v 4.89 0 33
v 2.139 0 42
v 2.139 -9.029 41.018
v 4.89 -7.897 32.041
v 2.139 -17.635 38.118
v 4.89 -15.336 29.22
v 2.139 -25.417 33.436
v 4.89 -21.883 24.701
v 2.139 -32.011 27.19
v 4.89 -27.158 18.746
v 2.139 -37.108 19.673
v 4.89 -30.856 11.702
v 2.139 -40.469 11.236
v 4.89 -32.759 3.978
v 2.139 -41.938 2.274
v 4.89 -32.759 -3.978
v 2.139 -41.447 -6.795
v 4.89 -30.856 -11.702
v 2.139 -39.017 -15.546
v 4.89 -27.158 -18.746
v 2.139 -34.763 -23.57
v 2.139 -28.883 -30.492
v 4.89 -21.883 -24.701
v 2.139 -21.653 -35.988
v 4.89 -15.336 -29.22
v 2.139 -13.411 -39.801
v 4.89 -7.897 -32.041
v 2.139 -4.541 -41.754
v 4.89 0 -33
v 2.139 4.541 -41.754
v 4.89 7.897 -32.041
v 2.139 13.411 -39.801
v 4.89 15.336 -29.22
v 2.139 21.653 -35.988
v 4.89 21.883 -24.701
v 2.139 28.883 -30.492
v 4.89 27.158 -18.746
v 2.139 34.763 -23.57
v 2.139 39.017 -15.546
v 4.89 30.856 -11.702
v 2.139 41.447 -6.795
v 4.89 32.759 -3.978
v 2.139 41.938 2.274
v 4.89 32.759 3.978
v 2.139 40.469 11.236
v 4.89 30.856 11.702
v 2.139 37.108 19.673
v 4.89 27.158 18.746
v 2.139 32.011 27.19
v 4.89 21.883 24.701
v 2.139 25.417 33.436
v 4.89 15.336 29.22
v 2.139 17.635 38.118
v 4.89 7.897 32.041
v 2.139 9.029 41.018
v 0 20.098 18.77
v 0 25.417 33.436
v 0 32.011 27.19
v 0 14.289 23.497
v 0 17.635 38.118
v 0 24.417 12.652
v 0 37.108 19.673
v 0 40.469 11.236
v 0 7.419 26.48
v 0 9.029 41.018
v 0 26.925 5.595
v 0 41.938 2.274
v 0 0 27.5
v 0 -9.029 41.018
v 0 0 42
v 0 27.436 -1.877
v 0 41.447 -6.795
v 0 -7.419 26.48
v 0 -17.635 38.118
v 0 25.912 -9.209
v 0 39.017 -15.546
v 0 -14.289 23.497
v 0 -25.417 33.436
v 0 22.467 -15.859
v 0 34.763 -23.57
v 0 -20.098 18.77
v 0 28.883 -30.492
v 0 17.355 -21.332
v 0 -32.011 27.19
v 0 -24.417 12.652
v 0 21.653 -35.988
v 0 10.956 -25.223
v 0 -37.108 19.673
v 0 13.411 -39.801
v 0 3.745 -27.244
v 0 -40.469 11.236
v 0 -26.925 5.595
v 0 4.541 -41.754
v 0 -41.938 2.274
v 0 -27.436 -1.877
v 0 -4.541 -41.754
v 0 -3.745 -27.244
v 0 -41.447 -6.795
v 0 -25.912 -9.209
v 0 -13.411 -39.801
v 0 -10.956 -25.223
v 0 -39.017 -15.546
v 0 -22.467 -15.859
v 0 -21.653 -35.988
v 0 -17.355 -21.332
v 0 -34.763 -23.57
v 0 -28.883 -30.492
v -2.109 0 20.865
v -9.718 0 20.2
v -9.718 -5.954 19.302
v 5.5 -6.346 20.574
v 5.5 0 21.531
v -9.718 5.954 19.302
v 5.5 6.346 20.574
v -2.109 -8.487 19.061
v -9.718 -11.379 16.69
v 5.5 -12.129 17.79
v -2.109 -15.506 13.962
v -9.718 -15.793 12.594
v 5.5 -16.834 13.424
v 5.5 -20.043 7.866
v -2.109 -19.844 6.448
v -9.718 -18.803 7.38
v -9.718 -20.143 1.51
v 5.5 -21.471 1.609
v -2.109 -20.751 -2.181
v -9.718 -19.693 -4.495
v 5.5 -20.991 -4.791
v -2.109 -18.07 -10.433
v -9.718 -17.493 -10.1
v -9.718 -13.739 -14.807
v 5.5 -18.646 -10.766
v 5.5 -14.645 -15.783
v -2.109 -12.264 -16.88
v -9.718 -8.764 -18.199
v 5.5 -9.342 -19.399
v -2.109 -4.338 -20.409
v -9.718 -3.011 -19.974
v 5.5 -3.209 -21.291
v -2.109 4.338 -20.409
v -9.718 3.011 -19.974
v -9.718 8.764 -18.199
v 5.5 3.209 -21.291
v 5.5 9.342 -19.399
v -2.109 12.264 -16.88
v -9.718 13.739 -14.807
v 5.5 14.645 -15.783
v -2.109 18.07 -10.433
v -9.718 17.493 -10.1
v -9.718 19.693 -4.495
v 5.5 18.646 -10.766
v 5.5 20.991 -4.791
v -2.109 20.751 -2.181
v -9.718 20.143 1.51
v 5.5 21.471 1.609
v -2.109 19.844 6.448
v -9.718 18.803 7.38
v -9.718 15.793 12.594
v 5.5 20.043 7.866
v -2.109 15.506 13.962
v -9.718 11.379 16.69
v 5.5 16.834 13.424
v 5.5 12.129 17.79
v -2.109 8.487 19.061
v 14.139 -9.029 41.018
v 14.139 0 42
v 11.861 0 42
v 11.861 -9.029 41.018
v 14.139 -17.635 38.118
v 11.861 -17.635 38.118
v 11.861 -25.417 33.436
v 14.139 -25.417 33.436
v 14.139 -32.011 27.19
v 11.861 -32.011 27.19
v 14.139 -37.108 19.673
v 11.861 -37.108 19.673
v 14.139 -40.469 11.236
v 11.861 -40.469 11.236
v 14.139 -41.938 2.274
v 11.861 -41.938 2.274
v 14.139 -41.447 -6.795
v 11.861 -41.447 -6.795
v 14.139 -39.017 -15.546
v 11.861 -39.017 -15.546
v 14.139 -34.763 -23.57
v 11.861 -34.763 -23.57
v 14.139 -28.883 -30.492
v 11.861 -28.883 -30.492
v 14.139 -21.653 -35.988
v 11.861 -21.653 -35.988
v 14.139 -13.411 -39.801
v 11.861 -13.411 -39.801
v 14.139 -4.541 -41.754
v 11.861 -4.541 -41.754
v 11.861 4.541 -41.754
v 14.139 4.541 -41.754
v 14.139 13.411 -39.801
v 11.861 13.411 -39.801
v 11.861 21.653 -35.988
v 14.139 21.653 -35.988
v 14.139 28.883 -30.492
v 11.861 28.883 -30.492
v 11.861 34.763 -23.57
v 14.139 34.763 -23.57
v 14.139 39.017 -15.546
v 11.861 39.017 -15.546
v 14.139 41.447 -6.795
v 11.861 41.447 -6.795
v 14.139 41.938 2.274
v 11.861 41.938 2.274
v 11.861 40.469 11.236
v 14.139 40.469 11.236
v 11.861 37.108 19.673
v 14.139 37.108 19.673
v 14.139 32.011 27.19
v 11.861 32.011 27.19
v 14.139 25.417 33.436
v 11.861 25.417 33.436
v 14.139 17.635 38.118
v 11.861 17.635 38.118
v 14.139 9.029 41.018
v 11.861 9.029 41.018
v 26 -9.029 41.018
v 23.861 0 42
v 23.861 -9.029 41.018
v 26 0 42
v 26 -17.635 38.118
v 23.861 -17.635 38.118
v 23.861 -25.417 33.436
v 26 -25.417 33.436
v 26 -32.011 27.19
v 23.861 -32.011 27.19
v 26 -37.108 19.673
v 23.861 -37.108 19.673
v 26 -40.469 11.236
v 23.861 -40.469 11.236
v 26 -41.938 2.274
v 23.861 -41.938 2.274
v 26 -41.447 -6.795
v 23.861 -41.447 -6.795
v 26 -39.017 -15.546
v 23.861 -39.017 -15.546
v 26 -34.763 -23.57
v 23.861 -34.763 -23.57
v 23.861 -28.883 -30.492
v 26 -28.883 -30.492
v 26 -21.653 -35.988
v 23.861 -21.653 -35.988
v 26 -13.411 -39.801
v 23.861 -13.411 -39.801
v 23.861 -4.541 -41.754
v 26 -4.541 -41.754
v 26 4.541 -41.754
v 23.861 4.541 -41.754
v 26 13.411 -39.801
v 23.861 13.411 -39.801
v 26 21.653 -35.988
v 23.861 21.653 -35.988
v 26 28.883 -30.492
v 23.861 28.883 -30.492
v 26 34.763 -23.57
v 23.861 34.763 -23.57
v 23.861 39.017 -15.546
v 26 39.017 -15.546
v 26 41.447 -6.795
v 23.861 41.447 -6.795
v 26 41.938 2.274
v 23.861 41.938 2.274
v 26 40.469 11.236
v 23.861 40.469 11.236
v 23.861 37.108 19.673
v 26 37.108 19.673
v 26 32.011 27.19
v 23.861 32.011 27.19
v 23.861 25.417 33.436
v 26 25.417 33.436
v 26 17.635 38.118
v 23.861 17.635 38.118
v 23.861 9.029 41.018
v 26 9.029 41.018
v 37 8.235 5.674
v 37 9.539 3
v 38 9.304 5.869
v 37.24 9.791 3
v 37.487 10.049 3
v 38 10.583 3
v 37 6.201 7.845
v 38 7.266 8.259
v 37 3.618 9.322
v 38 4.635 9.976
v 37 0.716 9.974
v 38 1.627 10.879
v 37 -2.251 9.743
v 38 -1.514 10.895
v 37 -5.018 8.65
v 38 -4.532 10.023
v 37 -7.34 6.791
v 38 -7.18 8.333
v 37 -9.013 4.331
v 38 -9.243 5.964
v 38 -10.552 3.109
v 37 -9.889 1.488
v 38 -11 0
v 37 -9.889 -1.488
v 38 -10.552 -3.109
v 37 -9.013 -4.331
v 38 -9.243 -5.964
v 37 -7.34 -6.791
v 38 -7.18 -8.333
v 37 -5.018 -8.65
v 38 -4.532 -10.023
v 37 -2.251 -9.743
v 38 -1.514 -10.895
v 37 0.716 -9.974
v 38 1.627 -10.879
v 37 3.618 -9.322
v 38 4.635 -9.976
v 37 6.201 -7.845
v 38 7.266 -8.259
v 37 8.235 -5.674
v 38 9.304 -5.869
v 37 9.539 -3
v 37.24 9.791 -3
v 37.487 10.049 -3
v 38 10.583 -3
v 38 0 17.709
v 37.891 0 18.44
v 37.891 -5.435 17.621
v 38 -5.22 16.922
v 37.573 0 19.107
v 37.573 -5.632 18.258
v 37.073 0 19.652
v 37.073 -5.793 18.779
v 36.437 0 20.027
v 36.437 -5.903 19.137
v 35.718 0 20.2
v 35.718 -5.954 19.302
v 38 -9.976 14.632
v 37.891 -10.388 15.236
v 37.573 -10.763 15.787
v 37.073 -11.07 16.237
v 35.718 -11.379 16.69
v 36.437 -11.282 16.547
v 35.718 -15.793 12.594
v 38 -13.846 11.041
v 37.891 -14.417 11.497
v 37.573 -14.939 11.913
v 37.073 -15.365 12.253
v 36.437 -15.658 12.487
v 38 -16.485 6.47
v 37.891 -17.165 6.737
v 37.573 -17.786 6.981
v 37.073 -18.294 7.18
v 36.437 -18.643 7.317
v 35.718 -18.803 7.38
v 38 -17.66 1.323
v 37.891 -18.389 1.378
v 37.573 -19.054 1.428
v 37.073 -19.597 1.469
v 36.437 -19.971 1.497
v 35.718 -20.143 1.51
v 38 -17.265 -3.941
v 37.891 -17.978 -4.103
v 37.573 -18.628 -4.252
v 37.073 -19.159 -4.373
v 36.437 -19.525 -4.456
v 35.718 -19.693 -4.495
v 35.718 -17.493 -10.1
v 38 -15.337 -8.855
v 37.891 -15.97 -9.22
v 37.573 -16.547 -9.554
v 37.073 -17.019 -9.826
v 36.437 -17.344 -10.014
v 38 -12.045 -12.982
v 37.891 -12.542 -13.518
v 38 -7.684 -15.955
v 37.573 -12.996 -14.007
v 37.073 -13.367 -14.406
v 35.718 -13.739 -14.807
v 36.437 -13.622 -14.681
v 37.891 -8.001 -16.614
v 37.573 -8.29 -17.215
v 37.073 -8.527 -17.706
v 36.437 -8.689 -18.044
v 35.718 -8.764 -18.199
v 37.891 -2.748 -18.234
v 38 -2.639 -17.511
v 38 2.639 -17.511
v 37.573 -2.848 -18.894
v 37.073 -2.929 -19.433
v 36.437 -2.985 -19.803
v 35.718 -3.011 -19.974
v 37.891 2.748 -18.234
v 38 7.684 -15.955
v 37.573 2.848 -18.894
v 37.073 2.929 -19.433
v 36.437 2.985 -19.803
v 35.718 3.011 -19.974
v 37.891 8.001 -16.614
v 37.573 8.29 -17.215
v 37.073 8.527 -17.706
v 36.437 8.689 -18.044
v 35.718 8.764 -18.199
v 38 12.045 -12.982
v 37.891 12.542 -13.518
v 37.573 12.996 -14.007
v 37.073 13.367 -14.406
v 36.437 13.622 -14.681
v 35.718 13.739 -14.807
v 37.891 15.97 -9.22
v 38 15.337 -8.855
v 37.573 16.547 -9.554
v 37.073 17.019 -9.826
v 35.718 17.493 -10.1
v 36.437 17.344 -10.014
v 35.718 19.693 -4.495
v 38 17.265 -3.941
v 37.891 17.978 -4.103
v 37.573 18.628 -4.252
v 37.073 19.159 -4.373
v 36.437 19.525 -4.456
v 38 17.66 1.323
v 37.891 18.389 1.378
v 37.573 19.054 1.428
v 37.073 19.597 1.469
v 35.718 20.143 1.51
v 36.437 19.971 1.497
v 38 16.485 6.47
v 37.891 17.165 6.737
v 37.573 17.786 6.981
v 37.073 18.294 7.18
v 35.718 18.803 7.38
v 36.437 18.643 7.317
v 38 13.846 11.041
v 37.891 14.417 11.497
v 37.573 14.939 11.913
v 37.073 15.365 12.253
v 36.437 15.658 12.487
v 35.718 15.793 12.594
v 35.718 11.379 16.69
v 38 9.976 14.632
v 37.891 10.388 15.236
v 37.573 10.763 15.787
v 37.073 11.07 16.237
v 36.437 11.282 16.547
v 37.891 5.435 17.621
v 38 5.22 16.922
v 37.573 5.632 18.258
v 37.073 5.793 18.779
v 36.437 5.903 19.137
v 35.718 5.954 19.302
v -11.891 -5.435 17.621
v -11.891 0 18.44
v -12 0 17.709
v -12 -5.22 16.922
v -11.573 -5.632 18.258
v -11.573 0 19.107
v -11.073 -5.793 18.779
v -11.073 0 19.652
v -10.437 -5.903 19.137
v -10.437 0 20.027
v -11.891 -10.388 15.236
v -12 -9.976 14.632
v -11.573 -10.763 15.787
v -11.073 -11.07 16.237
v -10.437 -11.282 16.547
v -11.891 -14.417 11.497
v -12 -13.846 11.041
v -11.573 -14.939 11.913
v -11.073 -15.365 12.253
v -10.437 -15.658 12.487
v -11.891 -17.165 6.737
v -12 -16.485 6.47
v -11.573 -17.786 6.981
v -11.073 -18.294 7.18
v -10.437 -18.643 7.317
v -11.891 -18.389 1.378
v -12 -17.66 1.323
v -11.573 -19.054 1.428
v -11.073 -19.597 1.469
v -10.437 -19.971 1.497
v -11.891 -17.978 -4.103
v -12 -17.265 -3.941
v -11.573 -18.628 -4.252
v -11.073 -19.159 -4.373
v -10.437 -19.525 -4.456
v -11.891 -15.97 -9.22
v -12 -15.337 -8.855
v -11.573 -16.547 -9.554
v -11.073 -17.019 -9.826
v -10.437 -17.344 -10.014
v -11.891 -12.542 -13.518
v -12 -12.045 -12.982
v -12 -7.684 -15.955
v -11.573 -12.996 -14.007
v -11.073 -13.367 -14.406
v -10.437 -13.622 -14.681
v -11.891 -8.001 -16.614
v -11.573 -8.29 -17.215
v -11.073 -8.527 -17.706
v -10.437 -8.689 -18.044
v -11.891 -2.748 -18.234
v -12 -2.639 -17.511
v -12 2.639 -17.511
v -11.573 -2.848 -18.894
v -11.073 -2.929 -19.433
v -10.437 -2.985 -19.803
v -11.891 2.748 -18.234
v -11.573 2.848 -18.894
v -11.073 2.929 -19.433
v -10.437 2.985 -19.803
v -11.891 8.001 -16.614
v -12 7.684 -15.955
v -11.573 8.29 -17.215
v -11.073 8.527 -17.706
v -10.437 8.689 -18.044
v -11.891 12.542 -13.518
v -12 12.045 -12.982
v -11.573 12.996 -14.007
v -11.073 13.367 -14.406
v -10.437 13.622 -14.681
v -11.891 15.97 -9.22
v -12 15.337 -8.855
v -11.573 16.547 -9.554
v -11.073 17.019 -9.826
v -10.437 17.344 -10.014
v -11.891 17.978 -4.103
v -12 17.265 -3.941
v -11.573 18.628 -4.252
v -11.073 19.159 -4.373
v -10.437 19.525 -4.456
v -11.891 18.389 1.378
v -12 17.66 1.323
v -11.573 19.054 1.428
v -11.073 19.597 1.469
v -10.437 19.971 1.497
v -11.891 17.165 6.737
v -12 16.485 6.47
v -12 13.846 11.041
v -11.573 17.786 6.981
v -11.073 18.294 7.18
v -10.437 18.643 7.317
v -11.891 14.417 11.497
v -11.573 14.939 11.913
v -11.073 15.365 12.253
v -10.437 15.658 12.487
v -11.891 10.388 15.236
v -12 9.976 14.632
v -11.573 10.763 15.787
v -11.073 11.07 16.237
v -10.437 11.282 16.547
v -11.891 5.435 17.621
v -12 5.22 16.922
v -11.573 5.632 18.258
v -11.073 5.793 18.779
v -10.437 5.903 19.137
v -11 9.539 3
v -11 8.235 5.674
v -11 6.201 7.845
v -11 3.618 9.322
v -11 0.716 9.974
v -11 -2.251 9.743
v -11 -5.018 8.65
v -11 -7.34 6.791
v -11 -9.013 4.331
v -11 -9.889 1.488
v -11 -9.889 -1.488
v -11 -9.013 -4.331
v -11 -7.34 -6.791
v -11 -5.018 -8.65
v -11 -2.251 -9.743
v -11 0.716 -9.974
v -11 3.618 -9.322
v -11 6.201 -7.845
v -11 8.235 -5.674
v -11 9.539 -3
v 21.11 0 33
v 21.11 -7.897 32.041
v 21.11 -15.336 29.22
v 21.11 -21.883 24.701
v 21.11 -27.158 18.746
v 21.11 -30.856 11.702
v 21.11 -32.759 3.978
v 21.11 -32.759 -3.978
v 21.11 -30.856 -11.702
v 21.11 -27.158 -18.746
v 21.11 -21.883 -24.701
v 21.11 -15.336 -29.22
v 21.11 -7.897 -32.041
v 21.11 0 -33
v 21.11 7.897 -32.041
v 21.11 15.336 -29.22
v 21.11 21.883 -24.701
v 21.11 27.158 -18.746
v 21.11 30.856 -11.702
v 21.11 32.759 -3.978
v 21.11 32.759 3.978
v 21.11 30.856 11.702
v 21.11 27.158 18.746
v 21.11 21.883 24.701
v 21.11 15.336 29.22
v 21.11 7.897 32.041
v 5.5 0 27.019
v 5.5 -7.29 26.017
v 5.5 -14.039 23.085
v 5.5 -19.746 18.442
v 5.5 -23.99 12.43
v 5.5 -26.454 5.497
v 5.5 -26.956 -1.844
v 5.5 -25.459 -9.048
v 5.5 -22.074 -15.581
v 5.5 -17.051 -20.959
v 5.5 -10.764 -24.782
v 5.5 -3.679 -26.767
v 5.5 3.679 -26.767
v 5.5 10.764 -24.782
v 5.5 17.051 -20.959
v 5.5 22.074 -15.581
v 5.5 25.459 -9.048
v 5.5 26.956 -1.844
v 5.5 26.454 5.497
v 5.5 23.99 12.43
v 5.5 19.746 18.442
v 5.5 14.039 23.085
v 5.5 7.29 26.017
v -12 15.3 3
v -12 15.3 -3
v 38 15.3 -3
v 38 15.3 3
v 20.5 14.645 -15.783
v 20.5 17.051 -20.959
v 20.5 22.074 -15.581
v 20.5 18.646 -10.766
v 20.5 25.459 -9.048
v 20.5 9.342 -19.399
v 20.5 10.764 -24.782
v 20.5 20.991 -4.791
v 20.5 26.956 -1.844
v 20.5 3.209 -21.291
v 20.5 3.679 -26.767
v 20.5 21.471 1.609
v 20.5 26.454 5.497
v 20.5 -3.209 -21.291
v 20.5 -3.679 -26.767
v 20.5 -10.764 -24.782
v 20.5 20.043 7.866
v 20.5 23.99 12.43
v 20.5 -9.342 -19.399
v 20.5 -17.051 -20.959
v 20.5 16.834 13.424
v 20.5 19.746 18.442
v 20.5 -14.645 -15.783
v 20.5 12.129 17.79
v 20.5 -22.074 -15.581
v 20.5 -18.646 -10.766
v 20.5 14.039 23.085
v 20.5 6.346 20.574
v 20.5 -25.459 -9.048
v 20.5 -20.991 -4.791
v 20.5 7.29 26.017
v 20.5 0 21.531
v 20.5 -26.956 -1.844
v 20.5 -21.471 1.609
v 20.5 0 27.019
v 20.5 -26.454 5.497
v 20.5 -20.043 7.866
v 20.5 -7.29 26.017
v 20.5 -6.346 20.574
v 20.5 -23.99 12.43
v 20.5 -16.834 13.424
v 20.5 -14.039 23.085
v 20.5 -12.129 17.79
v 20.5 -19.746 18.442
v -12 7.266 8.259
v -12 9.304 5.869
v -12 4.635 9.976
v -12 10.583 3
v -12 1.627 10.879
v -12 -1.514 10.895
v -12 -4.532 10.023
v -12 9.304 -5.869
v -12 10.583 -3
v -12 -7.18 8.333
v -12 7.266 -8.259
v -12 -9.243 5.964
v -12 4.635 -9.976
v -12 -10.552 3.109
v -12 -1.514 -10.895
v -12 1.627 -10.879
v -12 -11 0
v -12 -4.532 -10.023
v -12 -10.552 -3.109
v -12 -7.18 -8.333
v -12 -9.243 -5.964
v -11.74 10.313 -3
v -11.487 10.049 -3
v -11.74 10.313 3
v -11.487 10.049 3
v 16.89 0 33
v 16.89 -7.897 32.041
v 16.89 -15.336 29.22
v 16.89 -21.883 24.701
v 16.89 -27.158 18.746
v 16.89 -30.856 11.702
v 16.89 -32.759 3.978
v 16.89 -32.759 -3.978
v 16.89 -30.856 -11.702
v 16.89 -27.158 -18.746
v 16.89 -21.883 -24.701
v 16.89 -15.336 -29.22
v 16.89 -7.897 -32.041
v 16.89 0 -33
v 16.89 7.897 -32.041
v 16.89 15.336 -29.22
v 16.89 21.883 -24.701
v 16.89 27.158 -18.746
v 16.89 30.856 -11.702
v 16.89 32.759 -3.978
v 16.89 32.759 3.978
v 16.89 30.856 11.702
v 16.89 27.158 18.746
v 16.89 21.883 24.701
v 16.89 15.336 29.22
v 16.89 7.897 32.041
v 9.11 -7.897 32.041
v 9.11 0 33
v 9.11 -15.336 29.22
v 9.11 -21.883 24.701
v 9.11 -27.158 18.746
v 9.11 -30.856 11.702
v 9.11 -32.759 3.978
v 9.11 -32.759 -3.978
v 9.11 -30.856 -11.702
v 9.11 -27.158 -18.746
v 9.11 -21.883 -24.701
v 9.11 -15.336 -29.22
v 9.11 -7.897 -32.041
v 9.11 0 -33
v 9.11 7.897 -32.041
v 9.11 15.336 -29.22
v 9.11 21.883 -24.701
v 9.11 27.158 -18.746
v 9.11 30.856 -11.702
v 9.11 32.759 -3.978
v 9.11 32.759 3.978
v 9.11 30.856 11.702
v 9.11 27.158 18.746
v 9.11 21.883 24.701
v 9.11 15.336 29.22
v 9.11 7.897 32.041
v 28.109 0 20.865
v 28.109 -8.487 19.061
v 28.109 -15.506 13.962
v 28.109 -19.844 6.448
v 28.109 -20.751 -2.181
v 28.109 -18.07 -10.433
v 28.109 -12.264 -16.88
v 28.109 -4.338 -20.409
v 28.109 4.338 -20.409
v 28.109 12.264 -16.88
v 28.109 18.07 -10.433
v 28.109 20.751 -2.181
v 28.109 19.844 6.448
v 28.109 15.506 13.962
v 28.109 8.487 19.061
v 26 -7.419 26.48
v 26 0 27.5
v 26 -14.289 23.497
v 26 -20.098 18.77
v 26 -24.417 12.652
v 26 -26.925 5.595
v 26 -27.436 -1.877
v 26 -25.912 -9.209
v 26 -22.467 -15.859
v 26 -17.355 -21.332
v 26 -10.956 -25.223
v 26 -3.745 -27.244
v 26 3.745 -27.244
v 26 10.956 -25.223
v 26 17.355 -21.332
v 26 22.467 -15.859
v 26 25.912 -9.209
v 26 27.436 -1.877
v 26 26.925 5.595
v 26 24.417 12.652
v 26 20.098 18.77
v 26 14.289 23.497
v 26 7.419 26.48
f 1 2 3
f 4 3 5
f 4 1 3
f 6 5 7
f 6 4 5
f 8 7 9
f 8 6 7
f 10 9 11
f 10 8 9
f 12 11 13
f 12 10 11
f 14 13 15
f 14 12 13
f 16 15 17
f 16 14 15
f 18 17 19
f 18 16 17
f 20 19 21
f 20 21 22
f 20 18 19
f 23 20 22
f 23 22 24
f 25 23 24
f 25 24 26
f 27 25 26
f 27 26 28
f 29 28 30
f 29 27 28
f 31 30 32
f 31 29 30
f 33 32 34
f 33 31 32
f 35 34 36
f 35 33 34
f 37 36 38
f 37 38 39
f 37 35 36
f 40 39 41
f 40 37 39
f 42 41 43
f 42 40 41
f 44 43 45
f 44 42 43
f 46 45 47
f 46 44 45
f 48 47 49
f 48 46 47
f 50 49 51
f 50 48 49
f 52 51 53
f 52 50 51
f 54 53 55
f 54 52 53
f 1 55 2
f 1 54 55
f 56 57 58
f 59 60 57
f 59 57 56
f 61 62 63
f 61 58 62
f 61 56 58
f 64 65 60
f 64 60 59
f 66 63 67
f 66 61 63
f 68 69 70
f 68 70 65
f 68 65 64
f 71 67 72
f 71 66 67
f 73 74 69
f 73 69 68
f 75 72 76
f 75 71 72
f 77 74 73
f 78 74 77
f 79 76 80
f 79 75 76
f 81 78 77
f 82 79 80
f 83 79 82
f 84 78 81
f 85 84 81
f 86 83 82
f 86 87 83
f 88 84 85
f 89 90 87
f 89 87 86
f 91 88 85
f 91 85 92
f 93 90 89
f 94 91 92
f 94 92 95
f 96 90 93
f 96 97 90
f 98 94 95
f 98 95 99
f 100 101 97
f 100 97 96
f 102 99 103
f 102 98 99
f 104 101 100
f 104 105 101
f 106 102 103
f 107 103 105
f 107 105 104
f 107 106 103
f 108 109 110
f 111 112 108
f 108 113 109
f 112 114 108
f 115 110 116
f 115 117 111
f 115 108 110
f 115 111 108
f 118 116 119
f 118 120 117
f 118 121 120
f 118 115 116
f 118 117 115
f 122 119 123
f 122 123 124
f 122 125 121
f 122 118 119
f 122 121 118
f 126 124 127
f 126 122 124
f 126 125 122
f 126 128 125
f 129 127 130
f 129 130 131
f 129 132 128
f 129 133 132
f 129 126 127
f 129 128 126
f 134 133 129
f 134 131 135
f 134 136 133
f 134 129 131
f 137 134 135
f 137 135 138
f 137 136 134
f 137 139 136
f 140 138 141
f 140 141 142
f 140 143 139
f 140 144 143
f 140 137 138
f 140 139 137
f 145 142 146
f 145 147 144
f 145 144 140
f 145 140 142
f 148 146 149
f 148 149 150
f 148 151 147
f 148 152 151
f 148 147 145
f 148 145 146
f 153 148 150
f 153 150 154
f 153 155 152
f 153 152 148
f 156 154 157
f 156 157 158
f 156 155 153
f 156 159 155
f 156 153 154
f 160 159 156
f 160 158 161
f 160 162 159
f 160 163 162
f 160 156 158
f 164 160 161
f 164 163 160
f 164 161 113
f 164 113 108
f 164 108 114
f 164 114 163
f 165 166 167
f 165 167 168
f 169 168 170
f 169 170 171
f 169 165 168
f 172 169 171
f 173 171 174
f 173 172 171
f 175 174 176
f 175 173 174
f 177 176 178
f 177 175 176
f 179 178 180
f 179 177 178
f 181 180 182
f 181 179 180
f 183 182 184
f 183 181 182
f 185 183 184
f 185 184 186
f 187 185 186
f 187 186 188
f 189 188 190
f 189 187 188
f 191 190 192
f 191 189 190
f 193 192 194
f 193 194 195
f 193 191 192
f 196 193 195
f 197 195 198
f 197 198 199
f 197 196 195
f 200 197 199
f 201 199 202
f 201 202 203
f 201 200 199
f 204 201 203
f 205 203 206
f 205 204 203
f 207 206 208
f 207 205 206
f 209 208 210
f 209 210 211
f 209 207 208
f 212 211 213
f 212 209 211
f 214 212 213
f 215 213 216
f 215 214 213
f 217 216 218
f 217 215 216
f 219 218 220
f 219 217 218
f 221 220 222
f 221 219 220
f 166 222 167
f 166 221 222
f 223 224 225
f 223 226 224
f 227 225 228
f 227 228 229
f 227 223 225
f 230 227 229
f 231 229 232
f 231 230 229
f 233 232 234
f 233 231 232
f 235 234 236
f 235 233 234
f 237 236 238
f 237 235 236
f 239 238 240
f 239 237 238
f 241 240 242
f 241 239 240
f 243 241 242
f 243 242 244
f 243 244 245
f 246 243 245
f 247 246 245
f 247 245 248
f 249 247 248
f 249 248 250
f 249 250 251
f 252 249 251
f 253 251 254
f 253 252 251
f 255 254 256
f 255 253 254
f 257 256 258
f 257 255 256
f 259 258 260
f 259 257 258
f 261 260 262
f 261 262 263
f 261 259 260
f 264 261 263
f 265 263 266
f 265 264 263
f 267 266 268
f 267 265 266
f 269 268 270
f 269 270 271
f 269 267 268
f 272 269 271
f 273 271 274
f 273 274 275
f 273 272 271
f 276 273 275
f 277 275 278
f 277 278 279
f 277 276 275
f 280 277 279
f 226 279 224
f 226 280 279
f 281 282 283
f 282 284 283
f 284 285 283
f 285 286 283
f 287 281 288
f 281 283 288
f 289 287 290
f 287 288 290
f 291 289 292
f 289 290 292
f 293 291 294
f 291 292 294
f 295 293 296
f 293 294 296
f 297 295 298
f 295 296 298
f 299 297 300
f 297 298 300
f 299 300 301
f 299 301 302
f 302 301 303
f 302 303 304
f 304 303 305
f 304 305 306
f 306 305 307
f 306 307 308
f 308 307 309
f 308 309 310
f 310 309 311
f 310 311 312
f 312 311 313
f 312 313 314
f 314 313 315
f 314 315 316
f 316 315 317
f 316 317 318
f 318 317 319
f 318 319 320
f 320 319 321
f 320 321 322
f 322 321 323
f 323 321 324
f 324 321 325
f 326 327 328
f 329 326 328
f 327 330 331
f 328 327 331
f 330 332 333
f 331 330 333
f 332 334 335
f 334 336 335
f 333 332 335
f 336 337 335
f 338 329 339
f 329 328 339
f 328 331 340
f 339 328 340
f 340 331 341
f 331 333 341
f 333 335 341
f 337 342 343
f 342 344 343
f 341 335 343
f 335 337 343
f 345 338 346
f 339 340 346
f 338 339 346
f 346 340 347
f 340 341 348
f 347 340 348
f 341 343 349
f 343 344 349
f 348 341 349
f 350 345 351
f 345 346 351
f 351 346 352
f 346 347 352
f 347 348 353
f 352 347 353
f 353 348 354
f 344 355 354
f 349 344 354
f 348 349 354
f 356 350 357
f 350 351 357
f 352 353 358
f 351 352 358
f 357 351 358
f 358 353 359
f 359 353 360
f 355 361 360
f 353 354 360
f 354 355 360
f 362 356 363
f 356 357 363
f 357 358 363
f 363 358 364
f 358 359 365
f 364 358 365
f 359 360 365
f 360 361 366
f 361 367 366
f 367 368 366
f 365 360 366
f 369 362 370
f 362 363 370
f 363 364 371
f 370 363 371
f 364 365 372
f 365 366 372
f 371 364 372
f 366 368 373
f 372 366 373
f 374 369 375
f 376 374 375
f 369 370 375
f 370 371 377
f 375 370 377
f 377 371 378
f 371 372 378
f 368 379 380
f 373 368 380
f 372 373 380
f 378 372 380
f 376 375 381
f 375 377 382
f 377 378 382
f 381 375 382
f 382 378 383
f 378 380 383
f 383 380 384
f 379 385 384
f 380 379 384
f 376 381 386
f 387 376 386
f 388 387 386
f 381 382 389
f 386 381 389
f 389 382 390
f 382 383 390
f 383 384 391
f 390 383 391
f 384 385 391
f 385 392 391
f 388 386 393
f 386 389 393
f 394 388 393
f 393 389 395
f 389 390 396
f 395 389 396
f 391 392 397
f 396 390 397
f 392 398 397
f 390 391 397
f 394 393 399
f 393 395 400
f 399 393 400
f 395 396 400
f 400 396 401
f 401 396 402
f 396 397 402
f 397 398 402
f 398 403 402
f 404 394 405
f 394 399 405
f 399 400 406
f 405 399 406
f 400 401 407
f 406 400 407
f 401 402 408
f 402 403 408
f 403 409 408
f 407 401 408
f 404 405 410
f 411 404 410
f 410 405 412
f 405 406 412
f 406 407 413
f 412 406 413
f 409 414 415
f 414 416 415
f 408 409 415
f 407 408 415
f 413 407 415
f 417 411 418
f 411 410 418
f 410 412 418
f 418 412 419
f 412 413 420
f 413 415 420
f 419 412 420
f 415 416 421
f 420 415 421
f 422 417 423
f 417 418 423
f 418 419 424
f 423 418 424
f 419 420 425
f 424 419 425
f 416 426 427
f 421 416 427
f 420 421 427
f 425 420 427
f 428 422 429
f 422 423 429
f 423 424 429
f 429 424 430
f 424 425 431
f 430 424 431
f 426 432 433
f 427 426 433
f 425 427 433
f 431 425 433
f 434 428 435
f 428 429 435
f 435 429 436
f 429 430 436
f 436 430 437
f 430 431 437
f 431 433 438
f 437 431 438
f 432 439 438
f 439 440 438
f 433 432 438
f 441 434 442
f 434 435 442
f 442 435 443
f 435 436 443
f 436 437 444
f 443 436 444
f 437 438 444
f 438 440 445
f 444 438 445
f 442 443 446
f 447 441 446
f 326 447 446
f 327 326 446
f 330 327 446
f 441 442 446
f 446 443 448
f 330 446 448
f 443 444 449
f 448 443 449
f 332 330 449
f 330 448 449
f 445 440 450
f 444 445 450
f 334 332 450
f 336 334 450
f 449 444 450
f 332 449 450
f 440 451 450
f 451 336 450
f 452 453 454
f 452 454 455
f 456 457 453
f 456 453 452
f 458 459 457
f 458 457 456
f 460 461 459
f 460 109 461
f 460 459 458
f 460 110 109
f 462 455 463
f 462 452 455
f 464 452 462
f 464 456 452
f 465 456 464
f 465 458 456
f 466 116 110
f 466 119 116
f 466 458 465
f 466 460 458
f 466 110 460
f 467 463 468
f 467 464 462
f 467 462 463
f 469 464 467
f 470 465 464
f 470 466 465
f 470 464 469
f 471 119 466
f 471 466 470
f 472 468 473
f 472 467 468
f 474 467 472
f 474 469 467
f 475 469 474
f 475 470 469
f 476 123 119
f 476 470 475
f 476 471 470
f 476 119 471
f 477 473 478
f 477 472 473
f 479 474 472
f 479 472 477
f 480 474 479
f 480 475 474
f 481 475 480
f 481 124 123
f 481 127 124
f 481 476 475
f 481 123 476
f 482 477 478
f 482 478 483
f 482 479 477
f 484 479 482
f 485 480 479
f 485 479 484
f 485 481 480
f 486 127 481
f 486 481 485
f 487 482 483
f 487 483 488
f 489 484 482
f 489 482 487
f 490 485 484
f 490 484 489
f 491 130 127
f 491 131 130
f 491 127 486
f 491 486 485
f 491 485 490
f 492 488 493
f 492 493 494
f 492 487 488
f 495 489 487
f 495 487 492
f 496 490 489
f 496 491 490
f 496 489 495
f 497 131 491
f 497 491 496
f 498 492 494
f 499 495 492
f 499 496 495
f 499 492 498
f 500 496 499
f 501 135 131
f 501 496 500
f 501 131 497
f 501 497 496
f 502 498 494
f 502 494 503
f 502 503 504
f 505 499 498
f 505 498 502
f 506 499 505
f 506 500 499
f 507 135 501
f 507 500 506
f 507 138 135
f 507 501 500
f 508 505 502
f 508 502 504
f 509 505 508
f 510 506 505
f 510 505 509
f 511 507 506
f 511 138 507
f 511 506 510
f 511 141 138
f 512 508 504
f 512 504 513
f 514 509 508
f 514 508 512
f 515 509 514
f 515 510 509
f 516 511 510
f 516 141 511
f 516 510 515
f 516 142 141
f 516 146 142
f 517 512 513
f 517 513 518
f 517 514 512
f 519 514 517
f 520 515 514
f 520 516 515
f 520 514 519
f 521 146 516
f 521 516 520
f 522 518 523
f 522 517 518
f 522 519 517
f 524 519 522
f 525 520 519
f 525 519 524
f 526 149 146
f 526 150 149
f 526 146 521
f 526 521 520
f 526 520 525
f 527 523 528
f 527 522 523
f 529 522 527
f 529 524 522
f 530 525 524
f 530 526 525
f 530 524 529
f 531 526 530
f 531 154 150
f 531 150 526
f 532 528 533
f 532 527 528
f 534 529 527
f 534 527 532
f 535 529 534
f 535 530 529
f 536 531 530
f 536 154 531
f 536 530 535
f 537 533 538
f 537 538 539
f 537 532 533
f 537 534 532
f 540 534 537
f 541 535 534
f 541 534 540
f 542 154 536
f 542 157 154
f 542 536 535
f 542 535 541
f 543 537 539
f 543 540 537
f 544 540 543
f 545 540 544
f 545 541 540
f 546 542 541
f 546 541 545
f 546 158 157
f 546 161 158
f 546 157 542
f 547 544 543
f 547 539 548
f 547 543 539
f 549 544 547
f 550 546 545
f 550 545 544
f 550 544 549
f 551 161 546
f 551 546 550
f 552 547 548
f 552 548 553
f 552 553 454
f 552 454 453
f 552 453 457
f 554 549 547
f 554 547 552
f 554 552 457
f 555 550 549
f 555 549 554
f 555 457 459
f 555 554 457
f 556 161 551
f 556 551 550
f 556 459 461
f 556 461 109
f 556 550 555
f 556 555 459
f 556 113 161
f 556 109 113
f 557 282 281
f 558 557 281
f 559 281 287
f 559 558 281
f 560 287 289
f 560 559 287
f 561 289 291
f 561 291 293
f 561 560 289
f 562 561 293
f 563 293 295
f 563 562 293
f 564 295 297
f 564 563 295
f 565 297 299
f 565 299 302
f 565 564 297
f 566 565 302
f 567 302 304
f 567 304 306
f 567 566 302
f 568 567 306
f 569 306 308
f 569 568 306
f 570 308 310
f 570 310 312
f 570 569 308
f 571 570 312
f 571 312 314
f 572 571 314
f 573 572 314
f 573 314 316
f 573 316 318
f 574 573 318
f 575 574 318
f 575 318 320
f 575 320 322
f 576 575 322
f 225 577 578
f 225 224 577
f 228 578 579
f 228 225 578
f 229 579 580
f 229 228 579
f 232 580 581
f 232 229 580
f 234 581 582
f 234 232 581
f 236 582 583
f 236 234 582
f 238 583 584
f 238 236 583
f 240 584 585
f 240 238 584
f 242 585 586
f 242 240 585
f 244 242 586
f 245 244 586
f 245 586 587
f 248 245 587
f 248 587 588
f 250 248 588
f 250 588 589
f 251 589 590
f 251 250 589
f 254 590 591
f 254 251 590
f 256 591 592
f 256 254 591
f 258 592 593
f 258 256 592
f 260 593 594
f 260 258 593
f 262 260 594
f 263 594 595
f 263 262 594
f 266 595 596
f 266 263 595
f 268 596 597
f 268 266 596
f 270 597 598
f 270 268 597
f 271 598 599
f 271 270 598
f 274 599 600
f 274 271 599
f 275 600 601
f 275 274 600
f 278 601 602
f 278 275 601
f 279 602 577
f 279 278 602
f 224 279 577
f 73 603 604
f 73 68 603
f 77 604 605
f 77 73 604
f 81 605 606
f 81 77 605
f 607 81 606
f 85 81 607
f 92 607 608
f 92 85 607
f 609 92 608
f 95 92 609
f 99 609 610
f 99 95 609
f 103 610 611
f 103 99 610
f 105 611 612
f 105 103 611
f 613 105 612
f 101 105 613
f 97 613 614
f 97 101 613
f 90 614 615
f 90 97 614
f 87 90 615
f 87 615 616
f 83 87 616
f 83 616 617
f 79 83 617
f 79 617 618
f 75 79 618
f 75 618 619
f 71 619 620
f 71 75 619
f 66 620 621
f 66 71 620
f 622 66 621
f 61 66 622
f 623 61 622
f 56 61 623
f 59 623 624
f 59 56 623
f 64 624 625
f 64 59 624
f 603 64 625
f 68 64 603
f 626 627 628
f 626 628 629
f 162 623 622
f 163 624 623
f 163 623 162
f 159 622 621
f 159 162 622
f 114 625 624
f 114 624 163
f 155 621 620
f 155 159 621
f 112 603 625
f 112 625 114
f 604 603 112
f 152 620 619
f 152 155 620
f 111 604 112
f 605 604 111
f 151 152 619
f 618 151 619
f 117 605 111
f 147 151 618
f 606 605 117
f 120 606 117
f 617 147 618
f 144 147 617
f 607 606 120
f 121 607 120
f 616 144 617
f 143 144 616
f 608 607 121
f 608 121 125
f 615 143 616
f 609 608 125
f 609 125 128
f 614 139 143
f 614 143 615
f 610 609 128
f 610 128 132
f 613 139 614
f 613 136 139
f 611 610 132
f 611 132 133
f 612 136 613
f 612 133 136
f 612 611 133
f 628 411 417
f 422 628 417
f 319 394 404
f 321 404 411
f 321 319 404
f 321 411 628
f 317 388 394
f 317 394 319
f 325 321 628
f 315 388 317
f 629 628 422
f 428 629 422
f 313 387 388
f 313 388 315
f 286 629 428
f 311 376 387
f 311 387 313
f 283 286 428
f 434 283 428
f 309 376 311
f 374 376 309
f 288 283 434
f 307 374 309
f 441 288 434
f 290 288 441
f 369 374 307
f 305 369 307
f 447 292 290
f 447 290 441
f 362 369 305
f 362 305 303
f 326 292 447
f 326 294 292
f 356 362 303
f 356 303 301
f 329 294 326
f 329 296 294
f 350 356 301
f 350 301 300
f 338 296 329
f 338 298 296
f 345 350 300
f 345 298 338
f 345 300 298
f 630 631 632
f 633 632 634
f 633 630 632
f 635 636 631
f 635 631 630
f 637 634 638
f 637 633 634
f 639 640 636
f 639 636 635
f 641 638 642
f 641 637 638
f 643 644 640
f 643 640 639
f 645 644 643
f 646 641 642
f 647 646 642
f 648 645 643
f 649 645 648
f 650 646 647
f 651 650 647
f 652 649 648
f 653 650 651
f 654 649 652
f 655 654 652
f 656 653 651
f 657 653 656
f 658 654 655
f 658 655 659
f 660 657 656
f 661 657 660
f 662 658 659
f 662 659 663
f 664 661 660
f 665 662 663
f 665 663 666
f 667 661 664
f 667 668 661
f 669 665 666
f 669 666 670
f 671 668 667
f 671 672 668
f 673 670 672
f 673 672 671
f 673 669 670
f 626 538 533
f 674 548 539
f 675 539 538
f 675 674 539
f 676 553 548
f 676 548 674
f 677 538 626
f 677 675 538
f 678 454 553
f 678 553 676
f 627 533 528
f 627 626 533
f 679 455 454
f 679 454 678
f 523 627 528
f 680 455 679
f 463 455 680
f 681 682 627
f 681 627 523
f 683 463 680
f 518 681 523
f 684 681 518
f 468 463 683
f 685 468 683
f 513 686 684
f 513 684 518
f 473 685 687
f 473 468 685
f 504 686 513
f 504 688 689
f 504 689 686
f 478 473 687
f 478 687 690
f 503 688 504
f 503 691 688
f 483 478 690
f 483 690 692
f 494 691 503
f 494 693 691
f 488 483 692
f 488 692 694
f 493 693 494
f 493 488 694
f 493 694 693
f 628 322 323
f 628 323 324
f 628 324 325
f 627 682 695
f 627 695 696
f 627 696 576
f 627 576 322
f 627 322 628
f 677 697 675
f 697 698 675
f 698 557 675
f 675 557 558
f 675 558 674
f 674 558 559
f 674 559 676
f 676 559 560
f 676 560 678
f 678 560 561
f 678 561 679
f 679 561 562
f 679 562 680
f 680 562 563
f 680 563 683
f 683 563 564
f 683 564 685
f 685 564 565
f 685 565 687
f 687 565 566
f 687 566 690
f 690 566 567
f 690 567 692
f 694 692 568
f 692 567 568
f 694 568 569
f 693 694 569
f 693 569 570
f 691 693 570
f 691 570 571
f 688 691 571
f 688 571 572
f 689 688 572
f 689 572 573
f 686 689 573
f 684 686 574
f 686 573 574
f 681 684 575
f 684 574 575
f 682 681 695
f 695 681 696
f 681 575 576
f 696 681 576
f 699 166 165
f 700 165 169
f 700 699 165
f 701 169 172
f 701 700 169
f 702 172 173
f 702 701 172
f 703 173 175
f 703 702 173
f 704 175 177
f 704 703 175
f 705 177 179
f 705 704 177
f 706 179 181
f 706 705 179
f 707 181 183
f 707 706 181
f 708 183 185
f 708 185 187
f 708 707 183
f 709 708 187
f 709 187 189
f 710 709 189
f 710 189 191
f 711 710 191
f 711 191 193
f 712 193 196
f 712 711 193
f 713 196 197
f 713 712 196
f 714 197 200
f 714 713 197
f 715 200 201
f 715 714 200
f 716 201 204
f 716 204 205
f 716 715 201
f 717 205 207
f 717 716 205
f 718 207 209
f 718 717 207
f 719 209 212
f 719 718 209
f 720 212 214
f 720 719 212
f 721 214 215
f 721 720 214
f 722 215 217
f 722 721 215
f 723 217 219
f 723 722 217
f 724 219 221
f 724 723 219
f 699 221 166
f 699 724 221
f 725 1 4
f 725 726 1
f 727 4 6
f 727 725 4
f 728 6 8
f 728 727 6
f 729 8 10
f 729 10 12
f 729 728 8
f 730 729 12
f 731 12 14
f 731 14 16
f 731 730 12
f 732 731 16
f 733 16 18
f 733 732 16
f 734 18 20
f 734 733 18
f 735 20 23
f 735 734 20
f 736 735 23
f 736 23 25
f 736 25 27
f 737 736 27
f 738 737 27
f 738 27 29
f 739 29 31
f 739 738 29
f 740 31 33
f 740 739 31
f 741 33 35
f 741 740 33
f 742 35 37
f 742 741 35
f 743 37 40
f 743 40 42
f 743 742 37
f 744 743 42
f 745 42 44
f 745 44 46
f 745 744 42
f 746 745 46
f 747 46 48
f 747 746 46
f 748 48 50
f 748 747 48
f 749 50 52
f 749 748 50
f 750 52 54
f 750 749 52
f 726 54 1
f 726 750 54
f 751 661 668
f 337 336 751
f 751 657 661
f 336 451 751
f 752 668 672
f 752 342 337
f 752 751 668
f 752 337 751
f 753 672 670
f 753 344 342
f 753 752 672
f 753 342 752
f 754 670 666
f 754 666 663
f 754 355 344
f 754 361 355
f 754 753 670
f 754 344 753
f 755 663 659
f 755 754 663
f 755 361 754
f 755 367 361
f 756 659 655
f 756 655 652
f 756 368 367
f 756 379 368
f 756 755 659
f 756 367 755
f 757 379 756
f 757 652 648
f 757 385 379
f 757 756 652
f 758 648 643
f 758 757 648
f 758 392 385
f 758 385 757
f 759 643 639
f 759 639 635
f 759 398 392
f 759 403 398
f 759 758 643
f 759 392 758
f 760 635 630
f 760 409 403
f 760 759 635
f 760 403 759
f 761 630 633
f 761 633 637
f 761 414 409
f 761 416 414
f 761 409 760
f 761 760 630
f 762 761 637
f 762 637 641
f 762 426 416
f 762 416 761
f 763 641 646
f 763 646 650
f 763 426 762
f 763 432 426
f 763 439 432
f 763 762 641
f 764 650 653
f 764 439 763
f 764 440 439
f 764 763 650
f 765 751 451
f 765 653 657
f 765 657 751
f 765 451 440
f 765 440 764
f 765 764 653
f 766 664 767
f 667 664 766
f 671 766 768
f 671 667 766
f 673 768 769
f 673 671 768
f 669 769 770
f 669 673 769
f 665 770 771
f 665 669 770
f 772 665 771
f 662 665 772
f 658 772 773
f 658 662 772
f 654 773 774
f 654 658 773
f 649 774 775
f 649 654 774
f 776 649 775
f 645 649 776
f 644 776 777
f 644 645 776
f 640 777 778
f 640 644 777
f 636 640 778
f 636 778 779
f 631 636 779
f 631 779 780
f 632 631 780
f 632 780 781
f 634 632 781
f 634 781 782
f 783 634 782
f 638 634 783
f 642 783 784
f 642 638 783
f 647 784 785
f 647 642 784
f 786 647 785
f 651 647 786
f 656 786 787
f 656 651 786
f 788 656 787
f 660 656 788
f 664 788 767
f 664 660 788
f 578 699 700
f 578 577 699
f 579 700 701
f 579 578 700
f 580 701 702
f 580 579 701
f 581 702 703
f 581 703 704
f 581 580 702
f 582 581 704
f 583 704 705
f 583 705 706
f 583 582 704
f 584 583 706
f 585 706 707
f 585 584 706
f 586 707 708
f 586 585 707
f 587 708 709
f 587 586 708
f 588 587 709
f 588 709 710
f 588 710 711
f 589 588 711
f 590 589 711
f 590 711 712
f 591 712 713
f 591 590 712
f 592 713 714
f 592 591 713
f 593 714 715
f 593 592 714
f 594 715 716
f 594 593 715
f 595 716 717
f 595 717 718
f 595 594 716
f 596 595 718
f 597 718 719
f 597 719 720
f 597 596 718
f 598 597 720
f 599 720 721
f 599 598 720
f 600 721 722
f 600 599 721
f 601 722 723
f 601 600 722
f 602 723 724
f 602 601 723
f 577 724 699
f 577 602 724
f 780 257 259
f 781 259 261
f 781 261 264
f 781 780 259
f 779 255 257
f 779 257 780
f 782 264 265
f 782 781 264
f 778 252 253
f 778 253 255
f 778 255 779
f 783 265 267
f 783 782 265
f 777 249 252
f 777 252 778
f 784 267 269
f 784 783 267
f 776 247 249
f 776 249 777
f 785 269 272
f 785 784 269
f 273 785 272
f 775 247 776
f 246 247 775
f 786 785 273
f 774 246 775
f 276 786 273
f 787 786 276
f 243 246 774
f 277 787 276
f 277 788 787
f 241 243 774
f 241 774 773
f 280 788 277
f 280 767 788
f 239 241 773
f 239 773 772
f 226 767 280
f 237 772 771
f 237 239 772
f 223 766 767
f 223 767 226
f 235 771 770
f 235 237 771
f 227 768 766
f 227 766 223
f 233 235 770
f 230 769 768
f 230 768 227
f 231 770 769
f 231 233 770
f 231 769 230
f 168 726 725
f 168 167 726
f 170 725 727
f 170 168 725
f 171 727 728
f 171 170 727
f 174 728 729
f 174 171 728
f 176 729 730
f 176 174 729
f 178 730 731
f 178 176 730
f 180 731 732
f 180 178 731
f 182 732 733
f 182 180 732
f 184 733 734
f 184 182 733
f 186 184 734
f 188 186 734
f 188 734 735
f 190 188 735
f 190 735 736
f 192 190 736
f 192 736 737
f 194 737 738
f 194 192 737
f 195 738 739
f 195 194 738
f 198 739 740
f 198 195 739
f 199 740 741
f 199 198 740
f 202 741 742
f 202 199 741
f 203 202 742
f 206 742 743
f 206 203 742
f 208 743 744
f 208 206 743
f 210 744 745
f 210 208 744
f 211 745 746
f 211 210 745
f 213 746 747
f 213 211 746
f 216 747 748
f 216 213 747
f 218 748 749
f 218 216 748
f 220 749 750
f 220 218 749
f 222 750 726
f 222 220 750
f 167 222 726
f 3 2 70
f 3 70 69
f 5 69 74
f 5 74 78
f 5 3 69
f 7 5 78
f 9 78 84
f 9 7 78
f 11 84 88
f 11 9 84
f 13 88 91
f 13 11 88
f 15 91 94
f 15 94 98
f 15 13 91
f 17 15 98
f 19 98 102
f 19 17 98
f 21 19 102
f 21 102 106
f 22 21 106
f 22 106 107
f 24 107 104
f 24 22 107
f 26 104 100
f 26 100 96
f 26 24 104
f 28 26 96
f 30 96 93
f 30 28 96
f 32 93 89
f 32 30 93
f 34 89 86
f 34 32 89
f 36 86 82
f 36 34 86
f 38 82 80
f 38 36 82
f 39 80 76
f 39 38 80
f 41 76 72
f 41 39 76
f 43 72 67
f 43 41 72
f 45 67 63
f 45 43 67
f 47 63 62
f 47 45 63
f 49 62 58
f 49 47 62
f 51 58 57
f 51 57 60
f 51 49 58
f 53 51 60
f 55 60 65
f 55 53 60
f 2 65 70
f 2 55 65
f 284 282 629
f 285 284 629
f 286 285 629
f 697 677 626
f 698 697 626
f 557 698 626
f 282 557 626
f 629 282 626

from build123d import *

# Parameters (mm, degrees)
PATTERN_LINEAR_951_COUNT = 2
PATTERN_LINEAR_951_PITCH = 12
CHAMFER_1_SIZE           = 1
SKETCH_4_W               = 6
SKETCH_4_H               = 5.760607938
CUT_EXTRUDE_1_DEPTH      = 78.640195775
FILLET_2_R               = 2.5


with BuildPart() as part:
    # 草图1 → 旋转1 (revolve)
    with BuildSketch(Plane.XY, mode=Mode.PRIVATE) as revolve_1_sk:
        Polygon((-12, 10), (-12, 20), (5.5, 21.531051612), (5.5, 27.018812351), (0, 27.5), (0, 42), (26, 42), (26, 27.5), (20.5, 27.018812351), (20.5, 21.531051612), (38, 20), (38, 10), align=None)
    revolve(revolve_1_sk.sketch.rotate(Axis((0, 0, 0), (1, 0, 0)), 90), axis=Axis((0, 0, 0), (1, 0, 0)))

    # 草图2 → 切除-旋转1 (revolve, cut)
    with BuildSketch(Plane.XY, mode=Mode.PRIVATE) as cut_revolve_1_sk:
        Polygon((9.10988523, 33), (11.861461363, 42), (2.138538637, 42), (4.89011477, 33), align=None)
    cut_revolve_1 = revolve(cut_revolve_1_sk.sketch.rotate(Axis((0, 0, 0), (1, 0, 0)), 90), axis=Axis((0, 0, 0), (1, 0, 0)), mode=Mode.SUBTRACT)

    # Pattern Linear 951: 切除-旋转1 ×2
    with Locations(*[(i * PATTERN_LINEAR_951_PITCH, 0, 0) for i in range(1, PATTERN_LINEAR_951_COUNT)]):
        add(cut_revolve_1, mode=Mode.SUBTRACT)

    # 倒角1
    chamfer_1_edges = [part.edges().sort_by_distance(p)[0] for p in [
        (-12, 0, -10),
        (38, 0, -10),
    ]]
    chamfer(chamfer_1_edges, length=CHAMFER_1_SIZE)

    # 草图4 → 切除-拉伸1 (cut, through all)
    with BuildSketch(Plane.ZY.offset(12)):
        with Locations((0, 12.419695983)):
            Rectangle(SKETCH_4_W, SKETCH_4_H)
    extrude(amount=-CUT_EXTRUDE_1_DEPTH, mode=Mode.SUBTRACT)

    # 圆角2
    fillet_2_edges = [part.edges().sort_by_distance(p)[0] for p in [
        (-12, 0, -20),
        (38, 0, -20),
    ]]
    fillet(fillet_2_edges, radius=FILLET_2_R)


solid = part.part
